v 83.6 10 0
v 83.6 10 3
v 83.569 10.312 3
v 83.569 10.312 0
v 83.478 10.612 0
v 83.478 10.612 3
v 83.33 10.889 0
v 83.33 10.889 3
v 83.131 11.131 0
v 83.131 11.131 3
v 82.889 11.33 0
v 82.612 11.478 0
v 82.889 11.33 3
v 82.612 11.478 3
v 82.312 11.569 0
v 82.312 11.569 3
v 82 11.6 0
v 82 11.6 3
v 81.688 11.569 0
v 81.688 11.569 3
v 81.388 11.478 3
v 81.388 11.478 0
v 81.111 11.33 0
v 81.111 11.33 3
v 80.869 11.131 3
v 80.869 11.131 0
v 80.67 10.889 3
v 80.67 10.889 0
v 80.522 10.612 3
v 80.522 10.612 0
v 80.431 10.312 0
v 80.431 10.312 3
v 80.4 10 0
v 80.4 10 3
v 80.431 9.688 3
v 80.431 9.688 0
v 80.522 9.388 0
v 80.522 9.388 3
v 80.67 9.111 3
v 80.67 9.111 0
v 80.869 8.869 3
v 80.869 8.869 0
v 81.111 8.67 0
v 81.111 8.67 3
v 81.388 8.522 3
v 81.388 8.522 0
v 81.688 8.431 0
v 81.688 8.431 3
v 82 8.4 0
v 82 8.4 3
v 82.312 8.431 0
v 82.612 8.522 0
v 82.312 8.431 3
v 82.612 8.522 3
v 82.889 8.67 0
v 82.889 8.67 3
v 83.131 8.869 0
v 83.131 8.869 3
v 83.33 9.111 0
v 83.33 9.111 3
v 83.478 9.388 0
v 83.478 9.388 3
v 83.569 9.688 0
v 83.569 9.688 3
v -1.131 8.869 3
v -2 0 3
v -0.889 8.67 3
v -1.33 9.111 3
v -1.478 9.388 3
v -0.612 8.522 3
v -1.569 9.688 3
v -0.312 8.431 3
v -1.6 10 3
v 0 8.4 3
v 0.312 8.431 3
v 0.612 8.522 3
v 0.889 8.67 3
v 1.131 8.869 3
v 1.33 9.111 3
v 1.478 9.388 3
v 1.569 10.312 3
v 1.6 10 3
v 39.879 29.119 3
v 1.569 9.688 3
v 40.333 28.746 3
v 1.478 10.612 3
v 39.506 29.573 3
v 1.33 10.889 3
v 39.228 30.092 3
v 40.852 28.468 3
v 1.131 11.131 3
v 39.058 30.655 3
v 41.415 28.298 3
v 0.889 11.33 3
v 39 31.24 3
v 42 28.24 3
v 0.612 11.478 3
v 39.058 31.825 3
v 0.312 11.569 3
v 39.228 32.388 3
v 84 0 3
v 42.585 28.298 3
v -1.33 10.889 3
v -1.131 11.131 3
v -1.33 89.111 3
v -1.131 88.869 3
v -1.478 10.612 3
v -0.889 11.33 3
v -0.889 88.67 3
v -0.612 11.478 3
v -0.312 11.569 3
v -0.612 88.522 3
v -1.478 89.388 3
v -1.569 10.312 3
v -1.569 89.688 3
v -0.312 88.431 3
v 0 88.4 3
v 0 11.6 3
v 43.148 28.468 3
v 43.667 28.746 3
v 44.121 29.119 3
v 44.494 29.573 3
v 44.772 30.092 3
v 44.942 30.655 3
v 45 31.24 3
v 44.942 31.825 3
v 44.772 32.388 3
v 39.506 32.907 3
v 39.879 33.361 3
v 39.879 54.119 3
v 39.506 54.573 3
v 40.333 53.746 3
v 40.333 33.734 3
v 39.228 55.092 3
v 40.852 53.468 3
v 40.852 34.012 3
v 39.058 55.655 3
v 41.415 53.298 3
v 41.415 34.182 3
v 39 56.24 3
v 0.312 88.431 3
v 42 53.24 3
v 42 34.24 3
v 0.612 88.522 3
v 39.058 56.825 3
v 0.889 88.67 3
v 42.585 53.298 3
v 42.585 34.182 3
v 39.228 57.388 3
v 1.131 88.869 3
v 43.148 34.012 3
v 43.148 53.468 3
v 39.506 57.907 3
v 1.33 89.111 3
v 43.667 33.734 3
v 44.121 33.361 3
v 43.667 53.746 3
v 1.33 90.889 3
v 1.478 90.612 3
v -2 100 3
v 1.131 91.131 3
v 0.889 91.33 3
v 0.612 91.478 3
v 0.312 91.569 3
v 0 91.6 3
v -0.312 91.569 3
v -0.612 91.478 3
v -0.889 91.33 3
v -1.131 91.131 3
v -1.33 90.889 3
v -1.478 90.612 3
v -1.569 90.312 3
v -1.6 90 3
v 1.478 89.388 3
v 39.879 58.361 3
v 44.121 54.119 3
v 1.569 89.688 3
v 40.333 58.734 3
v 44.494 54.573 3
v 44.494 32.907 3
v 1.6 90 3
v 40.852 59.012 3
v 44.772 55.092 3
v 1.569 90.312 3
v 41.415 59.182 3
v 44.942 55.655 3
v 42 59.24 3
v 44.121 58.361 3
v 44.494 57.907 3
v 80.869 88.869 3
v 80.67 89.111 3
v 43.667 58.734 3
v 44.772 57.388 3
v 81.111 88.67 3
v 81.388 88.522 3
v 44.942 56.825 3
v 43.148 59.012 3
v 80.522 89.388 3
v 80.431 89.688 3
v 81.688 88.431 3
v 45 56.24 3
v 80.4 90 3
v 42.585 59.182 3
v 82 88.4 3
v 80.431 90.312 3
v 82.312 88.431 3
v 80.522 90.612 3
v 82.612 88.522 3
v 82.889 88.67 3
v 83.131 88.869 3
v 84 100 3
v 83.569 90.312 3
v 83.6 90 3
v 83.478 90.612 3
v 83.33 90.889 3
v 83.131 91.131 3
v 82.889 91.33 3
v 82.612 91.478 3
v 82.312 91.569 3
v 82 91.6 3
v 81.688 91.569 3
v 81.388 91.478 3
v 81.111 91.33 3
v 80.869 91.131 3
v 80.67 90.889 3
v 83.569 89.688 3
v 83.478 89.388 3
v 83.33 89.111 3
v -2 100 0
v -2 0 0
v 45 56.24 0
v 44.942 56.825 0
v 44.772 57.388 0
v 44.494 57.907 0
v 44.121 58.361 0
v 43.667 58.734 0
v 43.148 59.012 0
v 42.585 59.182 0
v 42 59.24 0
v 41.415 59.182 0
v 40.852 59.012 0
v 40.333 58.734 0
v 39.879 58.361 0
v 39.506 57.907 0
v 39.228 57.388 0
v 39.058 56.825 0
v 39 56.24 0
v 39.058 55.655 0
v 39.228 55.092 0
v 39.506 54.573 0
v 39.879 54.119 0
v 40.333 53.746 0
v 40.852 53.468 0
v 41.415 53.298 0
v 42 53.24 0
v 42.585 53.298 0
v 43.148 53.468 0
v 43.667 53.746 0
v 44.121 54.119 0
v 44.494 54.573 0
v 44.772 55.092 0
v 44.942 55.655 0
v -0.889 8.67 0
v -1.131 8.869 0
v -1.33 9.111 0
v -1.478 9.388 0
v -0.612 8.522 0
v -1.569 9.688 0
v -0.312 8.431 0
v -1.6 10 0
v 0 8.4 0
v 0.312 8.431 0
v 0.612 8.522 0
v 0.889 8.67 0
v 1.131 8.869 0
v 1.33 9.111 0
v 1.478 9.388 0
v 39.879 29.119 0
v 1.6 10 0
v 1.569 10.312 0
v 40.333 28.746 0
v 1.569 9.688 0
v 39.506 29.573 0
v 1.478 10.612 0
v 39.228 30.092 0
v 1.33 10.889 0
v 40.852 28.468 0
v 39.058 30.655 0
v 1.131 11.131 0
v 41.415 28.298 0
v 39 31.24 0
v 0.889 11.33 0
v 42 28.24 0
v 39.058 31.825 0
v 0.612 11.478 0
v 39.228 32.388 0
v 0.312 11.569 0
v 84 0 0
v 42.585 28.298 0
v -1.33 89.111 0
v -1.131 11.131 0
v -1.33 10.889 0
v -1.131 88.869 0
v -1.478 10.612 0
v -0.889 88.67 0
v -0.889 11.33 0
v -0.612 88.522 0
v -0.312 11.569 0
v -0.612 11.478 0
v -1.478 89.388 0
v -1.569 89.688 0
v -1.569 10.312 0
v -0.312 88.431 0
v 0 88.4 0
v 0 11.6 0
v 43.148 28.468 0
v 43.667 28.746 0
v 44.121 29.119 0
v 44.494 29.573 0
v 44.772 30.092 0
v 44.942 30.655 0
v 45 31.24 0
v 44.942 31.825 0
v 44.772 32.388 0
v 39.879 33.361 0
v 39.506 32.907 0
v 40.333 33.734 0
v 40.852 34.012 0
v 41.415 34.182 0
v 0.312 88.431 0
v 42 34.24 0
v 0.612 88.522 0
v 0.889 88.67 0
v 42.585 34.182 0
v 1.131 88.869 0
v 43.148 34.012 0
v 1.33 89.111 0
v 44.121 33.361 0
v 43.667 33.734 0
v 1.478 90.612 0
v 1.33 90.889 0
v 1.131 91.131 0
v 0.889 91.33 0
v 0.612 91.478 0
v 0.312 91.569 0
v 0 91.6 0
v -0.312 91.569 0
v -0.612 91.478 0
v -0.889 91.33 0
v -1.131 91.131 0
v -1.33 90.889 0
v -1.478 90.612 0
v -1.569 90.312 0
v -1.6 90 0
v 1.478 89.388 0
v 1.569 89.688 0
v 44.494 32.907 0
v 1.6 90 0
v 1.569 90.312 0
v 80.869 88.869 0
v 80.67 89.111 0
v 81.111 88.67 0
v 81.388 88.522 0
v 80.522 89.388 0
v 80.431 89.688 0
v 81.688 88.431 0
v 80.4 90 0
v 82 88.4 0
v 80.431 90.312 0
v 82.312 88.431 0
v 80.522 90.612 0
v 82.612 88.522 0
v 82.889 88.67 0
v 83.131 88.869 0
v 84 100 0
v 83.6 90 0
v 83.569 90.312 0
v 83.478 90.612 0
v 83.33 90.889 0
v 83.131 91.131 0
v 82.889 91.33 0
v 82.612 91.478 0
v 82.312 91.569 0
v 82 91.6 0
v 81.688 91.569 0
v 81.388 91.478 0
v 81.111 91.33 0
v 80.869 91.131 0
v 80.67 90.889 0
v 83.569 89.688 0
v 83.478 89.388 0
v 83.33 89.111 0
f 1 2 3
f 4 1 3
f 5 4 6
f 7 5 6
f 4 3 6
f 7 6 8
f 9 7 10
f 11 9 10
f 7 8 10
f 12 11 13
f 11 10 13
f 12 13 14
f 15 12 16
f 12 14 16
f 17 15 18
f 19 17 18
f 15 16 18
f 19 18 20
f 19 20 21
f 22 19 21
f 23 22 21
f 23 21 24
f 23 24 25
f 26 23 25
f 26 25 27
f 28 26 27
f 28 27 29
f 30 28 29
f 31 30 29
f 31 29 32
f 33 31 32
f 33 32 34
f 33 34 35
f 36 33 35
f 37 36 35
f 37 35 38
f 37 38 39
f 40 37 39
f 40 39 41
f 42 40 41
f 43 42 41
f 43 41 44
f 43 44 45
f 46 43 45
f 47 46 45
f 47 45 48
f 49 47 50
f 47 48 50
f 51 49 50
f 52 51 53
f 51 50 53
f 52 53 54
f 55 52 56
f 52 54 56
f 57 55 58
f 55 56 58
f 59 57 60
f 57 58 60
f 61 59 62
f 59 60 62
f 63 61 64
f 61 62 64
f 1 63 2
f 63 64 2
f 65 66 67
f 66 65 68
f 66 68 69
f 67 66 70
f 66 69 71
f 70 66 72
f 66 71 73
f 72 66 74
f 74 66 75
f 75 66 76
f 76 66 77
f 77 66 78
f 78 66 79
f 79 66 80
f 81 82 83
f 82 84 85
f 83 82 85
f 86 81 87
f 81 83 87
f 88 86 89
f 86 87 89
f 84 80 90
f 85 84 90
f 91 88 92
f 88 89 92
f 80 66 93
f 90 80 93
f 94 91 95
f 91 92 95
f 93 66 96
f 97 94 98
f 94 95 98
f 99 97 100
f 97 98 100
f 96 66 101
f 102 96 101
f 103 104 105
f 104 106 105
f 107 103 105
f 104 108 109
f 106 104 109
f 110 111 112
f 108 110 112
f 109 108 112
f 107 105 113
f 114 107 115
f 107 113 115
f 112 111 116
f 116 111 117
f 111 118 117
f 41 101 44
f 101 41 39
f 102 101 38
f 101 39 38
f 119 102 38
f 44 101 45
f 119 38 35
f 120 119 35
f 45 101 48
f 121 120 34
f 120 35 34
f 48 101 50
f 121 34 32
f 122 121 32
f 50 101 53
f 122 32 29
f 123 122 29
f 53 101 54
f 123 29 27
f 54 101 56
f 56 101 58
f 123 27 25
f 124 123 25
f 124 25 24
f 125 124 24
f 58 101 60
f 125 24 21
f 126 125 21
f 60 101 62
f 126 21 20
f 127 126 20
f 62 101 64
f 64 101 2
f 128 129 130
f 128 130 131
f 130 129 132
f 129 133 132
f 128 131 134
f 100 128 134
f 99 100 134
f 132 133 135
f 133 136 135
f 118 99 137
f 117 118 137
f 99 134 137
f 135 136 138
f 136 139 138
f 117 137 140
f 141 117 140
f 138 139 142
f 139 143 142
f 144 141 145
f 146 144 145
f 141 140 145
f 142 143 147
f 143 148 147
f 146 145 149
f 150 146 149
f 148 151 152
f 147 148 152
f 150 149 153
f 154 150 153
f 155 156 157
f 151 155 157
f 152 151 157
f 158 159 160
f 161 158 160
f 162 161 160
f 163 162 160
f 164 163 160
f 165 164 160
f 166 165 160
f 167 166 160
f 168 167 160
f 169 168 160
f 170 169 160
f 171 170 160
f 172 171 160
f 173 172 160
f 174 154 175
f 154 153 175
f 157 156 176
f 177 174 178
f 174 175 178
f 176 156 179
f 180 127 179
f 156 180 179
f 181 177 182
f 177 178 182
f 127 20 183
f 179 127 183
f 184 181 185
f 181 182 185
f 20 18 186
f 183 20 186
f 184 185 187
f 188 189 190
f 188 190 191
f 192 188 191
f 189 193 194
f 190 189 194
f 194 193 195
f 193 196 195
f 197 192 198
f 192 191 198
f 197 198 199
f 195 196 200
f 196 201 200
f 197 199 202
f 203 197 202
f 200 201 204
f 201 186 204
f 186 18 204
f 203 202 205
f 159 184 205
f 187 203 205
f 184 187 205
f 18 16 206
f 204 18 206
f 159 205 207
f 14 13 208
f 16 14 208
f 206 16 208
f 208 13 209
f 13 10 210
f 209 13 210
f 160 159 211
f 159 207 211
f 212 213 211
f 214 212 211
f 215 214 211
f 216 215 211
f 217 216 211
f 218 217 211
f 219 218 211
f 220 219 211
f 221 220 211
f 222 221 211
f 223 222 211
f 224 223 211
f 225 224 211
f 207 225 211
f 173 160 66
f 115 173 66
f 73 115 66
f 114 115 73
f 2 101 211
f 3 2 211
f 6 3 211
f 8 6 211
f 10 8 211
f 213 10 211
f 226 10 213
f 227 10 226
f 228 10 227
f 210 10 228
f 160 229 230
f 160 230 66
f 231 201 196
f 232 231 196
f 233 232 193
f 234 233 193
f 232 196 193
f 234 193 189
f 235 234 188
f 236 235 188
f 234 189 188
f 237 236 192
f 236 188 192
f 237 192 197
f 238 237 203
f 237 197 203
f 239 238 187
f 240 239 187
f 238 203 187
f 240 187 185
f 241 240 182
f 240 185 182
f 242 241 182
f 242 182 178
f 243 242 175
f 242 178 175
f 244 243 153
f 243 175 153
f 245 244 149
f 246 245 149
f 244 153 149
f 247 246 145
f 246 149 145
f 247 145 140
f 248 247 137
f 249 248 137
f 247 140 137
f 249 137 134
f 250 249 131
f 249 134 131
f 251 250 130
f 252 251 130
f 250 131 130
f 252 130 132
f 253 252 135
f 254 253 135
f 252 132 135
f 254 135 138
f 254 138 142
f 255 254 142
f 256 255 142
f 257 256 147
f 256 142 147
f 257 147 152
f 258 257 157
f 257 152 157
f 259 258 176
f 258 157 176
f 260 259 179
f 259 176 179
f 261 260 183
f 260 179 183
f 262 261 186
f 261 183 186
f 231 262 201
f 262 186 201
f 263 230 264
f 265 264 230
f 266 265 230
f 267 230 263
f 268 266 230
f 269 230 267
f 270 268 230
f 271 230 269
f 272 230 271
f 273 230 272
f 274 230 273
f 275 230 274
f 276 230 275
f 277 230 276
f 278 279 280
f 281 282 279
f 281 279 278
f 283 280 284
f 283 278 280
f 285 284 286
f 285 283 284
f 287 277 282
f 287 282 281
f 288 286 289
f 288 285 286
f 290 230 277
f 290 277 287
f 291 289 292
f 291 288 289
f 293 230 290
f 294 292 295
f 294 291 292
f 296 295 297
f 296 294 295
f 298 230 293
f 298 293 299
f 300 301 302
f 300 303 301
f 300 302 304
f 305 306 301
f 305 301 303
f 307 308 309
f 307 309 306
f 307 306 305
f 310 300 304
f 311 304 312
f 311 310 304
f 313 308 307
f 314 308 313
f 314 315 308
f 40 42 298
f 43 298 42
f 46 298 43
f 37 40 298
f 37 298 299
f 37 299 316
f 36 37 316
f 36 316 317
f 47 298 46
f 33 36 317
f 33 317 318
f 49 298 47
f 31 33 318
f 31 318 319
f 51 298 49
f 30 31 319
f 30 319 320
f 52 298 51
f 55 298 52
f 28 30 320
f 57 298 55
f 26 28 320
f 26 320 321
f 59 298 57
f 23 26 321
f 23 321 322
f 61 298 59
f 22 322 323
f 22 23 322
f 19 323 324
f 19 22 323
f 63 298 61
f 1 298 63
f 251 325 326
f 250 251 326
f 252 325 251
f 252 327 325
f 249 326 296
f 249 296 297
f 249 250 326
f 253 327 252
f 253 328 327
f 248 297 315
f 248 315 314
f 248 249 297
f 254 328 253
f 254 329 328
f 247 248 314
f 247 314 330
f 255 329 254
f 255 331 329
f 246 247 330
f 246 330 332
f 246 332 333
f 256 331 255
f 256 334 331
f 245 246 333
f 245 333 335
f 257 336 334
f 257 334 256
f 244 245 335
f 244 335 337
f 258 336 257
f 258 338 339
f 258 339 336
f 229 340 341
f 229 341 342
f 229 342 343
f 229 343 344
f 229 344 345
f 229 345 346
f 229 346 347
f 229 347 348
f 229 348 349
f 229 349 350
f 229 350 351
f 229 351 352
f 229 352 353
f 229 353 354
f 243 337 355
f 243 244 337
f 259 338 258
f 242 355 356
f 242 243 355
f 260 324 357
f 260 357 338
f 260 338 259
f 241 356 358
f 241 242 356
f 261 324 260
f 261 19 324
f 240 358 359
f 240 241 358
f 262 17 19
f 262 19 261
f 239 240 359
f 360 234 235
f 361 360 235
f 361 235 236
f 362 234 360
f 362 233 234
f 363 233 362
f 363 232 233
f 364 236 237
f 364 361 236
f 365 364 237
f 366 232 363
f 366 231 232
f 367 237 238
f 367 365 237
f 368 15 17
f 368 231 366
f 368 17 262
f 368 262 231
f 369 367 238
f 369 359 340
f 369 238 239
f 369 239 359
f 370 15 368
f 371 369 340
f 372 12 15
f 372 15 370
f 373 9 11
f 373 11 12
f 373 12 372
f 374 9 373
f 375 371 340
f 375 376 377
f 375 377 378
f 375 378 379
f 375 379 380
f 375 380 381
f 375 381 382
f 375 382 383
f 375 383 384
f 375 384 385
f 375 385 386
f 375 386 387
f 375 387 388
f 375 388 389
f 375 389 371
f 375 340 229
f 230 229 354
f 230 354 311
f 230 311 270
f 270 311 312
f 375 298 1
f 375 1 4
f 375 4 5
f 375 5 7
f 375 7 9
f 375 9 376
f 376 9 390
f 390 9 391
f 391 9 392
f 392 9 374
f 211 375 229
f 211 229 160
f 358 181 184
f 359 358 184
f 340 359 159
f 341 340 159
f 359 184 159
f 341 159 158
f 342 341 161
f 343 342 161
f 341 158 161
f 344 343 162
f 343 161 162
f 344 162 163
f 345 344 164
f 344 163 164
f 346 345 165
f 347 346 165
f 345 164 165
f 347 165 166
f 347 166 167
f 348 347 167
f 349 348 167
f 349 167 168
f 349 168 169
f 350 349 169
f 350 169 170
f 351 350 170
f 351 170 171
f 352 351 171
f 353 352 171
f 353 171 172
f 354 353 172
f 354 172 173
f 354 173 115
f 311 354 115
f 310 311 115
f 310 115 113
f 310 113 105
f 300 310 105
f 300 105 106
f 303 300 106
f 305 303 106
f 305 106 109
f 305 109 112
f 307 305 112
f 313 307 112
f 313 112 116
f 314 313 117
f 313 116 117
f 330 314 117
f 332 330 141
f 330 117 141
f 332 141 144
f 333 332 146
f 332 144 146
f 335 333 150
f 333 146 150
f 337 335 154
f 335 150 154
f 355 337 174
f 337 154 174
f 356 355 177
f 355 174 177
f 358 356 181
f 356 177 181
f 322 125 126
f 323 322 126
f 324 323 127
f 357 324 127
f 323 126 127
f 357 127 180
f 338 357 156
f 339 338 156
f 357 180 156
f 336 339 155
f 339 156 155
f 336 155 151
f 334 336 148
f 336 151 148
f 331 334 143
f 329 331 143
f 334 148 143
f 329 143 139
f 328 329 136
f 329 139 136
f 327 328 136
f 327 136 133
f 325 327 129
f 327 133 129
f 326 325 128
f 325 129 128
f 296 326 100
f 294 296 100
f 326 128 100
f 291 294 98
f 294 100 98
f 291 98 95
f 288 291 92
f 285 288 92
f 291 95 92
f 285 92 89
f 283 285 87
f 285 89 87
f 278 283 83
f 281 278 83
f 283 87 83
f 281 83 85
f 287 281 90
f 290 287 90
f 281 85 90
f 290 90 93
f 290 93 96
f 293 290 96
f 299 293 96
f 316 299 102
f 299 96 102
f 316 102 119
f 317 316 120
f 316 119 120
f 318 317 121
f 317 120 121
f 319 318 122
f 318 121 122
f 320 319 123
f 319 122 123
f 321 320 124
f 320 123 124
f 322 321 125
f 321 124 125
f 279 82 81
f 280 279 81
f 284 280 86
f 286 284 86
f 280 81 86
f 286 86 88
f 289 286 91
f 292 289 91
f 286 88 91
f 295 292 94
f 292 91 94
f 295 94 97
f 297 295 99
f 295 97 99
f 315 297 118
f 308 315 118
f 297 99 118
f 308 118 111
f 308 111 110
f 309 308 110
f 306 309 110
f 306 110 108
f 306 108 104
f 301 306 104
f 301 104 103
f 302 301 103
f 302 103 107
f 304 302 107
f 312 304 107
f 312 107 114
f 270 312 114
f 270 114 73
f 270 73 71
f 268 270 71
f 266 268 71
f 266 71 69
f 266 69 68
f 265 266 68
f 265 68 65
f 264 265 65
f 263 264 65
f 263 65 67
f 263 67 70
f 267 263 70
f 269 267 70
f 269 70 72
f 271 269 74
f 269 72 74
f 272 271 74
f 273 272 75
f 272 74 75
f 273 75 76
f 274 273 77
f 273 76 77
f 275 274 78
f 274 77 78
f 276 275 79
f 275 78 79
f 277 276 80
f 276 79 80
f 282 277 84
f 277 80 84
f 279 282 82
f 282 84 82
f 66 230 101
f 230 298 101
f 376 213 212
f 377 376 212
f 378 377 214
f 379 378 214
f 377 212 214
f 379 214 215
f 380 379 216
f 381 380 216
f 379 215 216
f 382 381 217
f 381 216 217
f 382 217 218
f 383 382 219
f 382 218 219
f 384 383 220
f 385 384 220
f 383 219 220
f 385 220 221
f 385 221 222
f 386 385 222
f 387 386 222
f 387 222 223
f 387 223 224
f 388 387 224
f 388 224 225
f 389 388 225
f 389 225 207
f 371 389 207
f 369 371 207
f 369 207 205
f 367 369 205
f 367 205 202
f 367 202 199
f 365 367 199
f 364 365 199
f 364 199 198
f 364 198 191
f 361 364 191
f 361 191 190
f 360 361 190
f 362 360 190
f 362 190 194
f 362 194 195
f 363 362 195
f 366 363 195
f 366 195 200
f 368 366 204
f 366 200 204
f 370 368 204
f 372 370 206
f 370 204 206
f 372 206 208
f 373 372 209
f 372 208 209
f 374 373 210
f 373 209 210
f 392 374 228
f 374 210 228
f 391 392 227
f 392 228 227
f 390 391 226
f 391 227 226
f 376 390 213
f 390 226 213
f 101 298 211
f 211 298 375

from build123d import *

# Parameters (mm, degrees)
SKETCH_1_W          = 84
SKETCH_1_H          = 100
EXTRUDE_1_DEPTH     = 3
SKETCH_3_R          = 3
CUT_EXTRUDE_1_DEPTH = 3
SKETCH_4_W          = 3
SKETCH_4_H          = 100
EXTRUDE_2_DEPTH     = 2
SKETCH_5_R          = 1.6
CUT_EXTRUDE_2_DEPTH = 4


with BuildPart() as part:
    # 草图1 → 凸台-拉伸1 (new body)
    with BuildSketch(Plane.XY):
        with Locations((42, 50)):
            Rectangle(SKETCH_1_W, SKETCH_1_H)
    extrude(amount=EXTRUDE_1_DEPTH)

    # 草图3 → 切除-拉伸1 (cut)
    with BuildSketch(Plane.XY.offset(3)):
        with Locations((42, 31.24)):
            Circle(SKETCH_3_R)
        with Locations((42, 56.24)):
            Circle(SKETCH_3_R)
    extrude(amount=-CUT_EXTRUDE_1_DEPTH, mode=Mode.SUBTRACT)

    # 草图4 → 凸台-拉伸2 (add)
    with BuildSketch(Plane.ZY):
        with Locations((1.5, 50)):
            Rectangle(SKETCH_4_W, SKETCH_4_H)
    extrude(amount=EXTRUDE_2_DEPTH)

    # 草图5 → 切除-拉伸2 (cut, through all)
    with BuildSketch(Plane.XY.offset(3)):
        with Locations((82, 10)):
            Circle(SKETCH_5_R)
        with Locations((82, 90)):
            Circle(SKETCH_5_R)
        with Locations((0, 90)):
            Circle(SKETCH_5_R)
        with Locations((0, 10)):
            Circle(SKETCH_5_R)
    extrude(amount=-CUT_EXTRUDE_2_DEPTH, mode=Mode.SUBTRACT)


solid = part.part
